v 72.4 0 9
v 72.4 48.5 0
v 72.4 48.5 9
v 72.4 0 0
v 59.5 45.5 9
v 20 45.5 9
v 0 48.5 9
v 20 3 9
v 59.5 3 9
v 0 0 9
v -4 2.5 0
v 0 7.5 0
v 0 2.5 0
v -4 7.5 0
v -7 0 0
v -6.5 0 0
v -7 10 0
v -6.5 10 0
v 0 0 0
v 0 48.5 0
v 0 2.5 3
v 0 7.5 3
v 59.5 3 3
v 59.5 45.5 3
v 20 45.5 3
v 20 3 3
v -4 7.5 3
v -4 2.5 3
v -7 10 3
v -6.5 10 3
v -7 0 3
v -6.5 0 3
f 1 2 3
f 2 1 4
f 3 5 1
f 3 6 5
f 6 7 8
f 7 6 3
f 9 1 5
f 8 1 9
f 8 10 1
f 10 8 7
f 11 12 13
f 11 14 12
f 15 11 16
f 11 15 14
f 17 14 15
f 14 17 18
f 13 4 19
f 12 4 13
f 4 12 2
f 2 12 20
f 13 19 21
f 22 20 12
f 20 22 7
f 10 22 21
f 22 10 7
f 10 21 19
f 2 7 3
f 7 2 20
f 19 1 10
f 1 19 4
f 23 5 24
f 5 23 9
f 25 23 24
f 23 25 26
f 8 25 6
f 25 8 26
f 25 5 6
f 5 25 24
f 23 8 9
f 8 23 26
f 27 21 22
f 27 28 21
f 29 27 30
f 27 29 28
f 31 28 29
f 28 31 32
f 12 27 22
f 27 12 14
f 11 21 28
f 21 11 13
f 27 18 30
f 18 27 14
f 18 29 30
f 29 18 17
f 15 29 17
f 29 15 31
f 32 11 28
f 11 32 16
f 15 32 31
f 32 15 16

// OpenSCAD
width = 40;
length = 200;
wallthickness = 3;

height = 220;

diameter = 55;
circleCentercut = 4.1;
motorwidth = 42.5;
motorlength = 39.5;
motorlengthWaxel = 63.4;



difference(){
    //motorbed
    translate([0,0,0])
    cube([motorlengthWaxel+wallthickness*3,motorwidth+wallthickness*2,wallthickness*3]);
    
    //motorCutout
    translate([20,wallthickness,wallthickness])
    cube([motorlength,motorwidth,wallthickness*3]);
}

translate([-7,2.5,0]){
//lock
scale([1,1,1]){
//hull(){
translate([2.5,0,0])
//base
cube([5,5,3]);
hull(){
translate([2.5,0,0])
cube([0.5,5,3]);
//long
translate([0,-2.5,0])
cube([0.5,10,3]);
    }
}
}
